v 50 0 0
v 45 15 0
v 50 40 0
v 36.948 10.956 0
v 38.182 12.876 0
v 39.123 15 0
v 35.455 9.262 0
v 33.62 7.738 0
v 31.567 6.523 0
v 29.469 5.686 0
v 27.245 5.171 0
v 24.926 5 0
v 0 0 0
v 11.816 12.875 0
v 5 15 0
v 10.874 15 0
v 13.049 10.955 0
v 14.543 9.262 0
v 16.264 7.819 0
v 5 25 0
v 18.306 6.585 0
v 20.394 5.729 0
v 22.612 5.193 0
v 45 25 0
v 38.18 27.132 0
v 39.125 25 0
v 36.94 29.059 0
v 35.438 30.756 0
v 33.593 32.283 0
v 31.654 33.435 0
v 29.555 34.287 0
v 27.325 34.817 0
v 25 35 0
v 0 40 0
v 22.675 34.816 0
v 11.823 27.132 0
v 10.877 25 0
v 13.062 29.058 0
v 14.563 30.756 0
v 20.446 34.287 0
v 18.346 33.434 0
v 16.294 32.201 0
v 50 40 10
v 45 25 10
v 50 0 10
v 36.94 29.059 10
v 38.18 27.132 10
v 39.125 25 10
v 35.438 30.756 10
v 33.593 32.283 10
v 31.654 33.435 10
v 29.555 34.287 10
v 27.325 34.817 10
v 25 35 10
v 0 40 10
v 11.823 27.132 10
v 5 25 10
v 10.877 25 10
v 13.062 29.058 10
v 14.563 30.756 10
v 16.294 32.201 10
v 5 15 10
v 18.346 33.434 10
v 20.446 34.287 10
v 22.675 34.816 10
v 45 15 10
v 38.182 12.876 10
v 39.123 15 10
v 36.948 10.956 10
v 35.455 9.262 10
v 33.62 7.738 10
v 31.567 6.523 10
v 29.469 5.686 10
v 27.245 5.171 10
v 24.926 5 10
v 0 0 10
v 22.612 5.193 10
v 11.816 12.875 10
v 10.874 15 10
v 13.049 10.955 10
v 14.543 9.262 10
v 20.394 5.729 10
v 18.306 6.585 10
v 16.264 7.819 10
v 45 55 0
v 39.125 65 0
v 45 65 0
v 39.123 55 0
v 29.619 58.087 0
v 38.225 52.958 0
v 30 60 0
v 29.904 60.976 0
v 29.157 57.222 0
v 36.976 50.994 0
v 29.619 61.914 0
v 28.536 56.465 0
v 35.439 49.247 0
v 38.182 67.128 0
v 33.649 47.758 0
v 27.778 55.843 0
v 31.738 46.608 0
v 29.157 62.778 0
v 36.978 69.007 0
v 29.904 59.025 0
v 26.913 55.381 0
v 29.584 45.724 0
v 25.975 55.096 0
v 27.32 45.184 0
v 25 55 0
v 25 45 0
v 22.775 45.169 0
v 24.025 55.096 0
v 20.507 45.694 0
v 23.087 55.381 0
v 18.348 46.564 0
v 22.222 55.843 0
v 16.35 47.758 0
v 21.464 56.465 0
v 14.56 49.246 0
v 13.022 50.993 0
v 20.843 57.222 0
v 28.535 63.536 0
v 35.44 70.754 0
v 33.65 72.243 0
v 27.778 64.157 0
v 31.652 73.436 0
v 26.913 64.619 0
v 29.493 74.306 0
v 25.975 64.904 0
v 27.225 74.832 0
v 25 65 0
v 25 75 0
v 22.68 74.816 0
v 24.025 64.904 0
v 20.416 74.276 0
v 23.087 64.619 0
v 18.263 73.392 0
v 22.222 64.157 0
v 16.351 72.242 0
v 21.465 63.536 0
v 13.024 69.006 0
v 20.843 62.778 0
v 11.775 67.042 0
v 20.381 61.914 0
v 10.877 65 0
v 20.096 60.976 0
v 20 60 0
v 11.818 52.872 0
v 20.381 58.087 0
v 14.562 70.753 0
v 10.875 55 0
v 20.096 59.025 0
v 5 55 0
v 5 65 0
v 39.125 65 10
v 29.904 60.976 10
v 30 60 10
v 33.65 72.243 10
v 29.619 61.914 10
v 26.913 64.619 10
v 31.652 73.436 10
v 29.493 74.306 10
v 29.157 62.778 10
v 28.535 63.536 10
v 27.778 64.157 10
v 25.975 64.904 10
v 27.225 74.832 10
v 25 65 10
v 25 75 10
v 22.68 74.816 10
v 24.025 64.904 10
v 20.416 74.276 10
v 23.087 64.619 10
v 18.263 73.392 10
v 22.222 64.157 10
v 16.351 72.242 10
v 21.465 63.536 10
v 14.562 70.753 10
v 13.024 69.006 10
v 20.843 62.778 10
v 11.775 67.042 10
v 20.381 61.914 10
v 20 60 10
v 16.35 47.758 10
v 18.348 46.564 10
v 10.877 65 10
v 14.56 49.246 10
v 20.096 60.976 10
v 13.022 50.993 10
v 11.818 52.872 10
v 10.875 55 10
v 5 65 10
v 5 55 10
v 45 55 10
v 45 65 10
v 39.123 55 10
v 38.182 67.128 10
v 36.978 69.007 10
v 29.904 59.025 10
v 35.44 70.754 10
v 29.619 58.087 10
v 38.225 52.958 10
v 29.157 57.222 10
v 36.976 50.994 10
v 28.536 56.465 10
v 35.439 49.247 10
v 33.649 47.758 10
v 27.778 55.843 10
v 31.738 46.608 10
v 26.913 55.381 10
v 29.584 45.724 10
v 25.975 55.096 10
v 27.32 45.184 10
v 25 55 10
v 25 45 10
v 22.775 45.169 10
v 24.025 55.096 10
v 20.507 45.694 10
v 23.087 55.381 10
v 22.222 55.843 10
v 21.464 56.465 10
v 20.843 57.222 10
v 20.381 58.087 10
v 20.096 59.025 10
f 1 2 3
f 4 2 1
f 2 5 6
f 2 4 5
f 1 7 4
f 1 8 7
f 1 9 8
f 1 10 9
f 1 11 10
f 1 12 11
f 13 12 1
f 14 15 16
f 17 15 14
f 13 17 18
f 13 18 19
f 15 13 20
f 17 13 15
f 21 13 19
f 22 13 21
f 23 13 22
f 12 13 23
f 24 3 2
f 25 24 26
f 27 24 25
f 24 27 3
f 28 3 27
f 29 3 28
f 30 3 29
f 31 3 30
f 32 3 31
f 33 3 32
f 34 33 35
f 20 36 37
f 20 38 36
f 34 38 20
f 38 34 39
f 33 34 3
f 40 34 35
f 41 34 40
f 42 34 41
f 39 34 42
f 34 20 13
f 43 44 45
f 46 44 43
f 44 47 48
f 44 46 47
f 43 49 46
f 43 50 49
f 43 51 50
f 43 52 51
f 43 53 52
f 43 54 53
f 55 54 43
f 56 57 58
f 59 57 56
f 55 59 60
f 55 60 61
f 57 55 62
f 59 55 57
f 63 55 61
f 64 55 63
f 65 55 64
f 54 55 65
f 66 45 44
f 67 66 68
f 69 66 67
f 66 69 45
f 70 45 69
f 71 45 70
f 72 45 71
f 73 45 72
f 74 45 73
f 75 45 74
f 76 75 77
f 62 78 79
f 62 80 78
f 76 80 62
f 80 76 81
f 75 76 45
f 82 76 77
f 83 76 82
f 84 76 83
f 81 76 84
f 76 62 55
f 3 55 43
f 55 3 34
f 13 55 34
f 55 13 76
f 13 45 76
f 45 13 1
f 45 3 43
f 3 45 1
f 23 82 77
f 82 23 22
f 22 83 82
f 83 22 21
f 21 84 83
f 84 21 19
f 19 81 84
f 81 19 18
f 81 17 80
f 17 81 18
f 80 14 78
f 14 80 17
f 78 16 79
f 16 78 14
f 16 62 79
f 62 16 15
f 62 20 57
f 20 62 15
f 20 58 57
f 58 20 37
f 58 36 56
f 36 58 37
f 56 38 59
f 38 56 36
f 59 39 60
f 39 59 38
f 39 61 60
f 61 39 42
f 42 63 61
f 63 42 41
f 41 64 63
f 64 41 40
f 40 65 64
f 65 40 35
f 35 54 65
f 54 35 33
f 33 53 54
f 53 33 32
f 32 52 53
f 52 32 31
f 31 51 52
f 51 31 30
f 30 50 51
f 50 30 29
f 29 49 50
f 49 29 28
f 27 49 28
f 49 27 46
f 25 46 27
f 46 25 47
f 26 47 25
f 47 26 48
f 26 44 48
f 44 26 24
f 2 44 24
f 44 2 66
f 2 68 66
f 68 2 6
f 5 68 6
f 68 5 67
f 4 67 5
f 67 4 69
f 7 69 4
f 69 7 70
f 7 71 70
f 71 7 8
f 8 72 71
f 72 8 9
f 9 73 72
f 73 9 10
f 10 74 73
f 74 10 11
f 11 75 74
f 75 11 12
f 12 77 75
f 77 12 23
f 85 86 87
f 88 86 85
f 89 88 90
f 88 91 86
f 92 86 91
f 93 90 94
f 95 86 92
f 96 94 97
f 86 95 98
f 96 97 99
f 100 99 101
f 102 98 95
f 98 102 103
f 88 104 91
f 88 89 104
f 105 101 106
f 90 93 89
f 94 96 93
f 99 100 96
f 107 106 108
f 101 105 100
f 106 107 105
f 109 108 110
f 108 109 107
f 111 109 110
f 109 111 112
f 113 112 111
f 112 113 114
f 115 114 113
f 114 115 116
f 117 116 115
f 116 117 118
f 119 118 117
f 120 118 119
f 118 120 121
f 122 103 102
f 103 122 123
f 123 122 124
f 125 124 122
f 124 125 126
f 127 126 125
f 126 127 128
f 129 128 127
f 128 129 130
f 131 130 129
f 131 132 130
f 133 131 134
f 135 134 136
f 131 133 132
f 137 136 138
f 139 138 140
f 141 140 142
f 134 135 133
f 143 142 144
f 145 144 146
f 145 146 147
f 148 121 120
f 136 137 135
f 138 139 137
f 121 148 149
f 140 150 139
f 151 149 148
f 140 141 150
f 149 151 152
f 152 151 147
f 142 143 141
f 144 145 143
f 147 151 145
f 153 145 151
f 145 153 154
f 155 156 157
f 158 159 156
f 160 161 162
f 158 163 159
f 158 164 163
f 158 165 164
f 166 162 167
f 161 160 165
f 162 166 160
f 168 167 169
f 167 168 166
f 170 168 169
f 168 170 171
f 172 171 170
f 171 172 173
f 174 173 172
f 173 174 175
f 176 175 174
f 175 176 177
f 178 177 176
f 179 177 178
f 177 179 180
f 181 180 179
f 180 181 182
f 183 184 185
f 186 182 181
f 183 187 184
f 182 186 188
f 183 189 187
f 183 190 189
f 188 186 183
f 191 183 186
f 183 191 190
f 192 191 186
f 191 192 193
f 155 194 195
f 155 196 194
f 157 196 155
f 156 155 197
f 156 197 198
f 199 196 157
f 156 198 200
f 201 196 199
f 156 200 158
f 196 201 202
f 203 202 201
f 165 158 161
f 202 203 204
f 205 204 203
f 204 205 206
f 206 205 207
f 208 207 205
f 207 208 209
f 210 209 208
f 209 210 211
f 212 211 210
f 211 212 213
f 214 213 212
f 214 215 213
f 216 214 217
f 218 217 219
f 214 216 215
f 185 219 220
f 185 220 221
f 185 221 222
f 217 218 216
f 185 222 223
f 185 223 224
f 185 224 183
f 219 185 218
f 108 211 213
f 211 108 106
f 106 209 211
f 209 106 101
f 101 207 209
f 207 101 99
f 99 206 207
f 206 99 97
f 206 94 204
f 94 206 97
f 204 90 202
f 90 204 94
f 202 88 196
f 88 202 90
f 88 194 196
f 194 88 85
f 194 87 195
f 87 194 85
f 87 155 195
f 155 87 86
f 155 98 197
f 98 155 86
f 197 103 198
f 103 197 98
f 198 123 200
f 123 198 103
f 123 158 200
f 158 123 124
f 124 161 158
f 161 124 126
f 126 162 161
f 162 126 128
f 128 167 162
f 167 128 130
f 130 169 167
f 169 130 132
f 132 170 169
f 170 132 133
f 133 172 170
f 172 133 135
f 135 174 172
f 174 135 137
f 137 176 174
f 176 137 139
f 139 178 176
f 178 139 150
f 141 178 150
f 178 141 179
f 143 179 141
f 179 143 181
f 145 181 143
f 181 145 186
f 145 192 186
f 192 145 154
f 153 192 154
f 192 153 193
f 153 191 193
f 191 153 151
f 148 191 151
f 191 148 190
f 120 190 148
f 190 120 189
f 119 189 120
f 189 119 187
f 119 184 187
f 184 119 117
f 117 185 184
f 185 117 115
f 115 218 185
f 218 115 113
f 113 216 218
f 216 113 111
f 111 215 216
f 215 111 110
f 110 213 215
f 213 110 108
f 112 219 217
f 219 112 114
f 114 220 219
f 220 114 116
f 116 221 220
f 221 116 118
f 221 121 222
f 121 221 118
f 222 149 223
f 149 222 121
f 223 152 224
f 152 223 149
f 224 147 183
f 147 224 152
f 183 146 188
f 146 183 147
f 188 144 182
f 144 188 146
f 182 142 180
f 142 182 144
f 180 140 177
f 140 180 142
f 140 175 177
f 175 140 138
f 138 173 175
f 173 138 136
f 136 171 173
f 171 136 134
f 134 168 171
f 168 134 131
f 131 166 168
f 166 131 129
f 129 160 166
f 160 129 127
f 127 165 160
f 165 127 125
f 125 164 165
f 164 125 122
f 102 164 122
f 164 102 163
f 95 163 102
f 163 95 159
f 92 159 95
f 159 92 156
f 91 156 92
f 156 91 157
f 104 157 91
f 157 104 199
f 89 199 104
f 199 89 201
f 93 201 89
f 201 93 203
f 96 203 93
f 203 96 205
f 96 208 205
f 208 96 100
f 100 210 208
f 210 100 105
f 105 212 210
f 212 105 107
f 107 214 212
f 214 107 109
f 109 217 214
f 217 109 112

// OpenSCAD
linear_extrude(10)
polygon(points=[[0,40],[0,0],[50,0],[50,40],[25,35],[27.325,34.817],[29.555,34.287],[31.654,33.435],[33.593,32.283],[35.438,30.756],[36.94,29.059],[38.18,27.132],[39.125,25],[45,25],[45,15],[39.123,15],[38.182,12.876],[36.948,10.956],[35.455,9.262],[33.62,7.738],[31.567,6.523],[29.469,5.686],[27.245,5.171],[24.926,5],[22.612,5.193],[20.394,5.729],[18.306,6.585],[16.264,7.819],[14.543,9.262],[13.049,10.955],[11.816,12.875],[10.874,15],[5,15],[5,25],[10.877,25],[11.823,27.132],[13.062,29.058],[14.563,30.756],[16.294,32.201],[18.346,33.434],[20.446,34.287],[22.675,34.816]],paths=[[0,1,2,3],[4,5,6,7,8,9,10,11,12,13,14,15,16,17,18,19,20,21,22,23,24,25,26,27,28,29,30,31,32,33,34,35,36,37,38,39,40,41]]);
linear_extrude(10)
polygon(points=[[25,75],[22.68,74.816],[20.416,74.276],[18.263,73.392],[16.351,72.242],[14.562,70.753],[13.024,69.006],[11.775,67.042],[10.877,65],[5,65],[5,55],[10.875,55],[11.818,52.872],[13.022,50.993],[14.56,49.246],[16.35,47.758],[18.348,46.564],[20.507,45.694],[22.775,45.169],[25,45],[27.32,45.184],[29.584,45.724],[31.738,46.608],[33.649,47.758],[35.439,49.247],[36.976,50.994],[38.225,52.958],[39.123,55],[45,55],[45,65],[39.125,65],[38.182,67.128],[36.978,69.007],[35.44,70.754],[33.65,72.243],[31.652,73.436],[29.493,74.306],[27.225,74.832],[25,65],[25.975,64.904],[26.913,64.619],[27.778,64.157],[28.535,63.536],[29.157,62.778],[29.619,61.914],[29.904,60.976],[30,60],[29.904,59.025],[29.619,58.087],[29.157,57.222],[28.536,56.465],[27.778,55.843],[26.913,55.381],[25.975,55.096],[25,55],[24.025,55.096],[23.087,55.381],[22.222,55.843],[21.464,56.465],[20.843,57.222],[20.381,58.087],[20.096,59.025],[20,60],[20.096,60.976],[20.381,61.914],[20.843,62.778],[21.465,63.536],[22.222,64.157],[23.087,64.619],[24.025,64.904]],paths=[[0,1,2,3,4,5,6,7,8,9,10,11,12,13,14,15,16,17,18,19,20,21,22,23,24,25,26,27,28,29,30,31,32,33,34,35,36,37],[38,39,40,41,42,43,44,45,46,47,48,49,50,51,52,53,54,55,56,57,58,59,60,61,62,63,64,65,66,67,68,69]]);
